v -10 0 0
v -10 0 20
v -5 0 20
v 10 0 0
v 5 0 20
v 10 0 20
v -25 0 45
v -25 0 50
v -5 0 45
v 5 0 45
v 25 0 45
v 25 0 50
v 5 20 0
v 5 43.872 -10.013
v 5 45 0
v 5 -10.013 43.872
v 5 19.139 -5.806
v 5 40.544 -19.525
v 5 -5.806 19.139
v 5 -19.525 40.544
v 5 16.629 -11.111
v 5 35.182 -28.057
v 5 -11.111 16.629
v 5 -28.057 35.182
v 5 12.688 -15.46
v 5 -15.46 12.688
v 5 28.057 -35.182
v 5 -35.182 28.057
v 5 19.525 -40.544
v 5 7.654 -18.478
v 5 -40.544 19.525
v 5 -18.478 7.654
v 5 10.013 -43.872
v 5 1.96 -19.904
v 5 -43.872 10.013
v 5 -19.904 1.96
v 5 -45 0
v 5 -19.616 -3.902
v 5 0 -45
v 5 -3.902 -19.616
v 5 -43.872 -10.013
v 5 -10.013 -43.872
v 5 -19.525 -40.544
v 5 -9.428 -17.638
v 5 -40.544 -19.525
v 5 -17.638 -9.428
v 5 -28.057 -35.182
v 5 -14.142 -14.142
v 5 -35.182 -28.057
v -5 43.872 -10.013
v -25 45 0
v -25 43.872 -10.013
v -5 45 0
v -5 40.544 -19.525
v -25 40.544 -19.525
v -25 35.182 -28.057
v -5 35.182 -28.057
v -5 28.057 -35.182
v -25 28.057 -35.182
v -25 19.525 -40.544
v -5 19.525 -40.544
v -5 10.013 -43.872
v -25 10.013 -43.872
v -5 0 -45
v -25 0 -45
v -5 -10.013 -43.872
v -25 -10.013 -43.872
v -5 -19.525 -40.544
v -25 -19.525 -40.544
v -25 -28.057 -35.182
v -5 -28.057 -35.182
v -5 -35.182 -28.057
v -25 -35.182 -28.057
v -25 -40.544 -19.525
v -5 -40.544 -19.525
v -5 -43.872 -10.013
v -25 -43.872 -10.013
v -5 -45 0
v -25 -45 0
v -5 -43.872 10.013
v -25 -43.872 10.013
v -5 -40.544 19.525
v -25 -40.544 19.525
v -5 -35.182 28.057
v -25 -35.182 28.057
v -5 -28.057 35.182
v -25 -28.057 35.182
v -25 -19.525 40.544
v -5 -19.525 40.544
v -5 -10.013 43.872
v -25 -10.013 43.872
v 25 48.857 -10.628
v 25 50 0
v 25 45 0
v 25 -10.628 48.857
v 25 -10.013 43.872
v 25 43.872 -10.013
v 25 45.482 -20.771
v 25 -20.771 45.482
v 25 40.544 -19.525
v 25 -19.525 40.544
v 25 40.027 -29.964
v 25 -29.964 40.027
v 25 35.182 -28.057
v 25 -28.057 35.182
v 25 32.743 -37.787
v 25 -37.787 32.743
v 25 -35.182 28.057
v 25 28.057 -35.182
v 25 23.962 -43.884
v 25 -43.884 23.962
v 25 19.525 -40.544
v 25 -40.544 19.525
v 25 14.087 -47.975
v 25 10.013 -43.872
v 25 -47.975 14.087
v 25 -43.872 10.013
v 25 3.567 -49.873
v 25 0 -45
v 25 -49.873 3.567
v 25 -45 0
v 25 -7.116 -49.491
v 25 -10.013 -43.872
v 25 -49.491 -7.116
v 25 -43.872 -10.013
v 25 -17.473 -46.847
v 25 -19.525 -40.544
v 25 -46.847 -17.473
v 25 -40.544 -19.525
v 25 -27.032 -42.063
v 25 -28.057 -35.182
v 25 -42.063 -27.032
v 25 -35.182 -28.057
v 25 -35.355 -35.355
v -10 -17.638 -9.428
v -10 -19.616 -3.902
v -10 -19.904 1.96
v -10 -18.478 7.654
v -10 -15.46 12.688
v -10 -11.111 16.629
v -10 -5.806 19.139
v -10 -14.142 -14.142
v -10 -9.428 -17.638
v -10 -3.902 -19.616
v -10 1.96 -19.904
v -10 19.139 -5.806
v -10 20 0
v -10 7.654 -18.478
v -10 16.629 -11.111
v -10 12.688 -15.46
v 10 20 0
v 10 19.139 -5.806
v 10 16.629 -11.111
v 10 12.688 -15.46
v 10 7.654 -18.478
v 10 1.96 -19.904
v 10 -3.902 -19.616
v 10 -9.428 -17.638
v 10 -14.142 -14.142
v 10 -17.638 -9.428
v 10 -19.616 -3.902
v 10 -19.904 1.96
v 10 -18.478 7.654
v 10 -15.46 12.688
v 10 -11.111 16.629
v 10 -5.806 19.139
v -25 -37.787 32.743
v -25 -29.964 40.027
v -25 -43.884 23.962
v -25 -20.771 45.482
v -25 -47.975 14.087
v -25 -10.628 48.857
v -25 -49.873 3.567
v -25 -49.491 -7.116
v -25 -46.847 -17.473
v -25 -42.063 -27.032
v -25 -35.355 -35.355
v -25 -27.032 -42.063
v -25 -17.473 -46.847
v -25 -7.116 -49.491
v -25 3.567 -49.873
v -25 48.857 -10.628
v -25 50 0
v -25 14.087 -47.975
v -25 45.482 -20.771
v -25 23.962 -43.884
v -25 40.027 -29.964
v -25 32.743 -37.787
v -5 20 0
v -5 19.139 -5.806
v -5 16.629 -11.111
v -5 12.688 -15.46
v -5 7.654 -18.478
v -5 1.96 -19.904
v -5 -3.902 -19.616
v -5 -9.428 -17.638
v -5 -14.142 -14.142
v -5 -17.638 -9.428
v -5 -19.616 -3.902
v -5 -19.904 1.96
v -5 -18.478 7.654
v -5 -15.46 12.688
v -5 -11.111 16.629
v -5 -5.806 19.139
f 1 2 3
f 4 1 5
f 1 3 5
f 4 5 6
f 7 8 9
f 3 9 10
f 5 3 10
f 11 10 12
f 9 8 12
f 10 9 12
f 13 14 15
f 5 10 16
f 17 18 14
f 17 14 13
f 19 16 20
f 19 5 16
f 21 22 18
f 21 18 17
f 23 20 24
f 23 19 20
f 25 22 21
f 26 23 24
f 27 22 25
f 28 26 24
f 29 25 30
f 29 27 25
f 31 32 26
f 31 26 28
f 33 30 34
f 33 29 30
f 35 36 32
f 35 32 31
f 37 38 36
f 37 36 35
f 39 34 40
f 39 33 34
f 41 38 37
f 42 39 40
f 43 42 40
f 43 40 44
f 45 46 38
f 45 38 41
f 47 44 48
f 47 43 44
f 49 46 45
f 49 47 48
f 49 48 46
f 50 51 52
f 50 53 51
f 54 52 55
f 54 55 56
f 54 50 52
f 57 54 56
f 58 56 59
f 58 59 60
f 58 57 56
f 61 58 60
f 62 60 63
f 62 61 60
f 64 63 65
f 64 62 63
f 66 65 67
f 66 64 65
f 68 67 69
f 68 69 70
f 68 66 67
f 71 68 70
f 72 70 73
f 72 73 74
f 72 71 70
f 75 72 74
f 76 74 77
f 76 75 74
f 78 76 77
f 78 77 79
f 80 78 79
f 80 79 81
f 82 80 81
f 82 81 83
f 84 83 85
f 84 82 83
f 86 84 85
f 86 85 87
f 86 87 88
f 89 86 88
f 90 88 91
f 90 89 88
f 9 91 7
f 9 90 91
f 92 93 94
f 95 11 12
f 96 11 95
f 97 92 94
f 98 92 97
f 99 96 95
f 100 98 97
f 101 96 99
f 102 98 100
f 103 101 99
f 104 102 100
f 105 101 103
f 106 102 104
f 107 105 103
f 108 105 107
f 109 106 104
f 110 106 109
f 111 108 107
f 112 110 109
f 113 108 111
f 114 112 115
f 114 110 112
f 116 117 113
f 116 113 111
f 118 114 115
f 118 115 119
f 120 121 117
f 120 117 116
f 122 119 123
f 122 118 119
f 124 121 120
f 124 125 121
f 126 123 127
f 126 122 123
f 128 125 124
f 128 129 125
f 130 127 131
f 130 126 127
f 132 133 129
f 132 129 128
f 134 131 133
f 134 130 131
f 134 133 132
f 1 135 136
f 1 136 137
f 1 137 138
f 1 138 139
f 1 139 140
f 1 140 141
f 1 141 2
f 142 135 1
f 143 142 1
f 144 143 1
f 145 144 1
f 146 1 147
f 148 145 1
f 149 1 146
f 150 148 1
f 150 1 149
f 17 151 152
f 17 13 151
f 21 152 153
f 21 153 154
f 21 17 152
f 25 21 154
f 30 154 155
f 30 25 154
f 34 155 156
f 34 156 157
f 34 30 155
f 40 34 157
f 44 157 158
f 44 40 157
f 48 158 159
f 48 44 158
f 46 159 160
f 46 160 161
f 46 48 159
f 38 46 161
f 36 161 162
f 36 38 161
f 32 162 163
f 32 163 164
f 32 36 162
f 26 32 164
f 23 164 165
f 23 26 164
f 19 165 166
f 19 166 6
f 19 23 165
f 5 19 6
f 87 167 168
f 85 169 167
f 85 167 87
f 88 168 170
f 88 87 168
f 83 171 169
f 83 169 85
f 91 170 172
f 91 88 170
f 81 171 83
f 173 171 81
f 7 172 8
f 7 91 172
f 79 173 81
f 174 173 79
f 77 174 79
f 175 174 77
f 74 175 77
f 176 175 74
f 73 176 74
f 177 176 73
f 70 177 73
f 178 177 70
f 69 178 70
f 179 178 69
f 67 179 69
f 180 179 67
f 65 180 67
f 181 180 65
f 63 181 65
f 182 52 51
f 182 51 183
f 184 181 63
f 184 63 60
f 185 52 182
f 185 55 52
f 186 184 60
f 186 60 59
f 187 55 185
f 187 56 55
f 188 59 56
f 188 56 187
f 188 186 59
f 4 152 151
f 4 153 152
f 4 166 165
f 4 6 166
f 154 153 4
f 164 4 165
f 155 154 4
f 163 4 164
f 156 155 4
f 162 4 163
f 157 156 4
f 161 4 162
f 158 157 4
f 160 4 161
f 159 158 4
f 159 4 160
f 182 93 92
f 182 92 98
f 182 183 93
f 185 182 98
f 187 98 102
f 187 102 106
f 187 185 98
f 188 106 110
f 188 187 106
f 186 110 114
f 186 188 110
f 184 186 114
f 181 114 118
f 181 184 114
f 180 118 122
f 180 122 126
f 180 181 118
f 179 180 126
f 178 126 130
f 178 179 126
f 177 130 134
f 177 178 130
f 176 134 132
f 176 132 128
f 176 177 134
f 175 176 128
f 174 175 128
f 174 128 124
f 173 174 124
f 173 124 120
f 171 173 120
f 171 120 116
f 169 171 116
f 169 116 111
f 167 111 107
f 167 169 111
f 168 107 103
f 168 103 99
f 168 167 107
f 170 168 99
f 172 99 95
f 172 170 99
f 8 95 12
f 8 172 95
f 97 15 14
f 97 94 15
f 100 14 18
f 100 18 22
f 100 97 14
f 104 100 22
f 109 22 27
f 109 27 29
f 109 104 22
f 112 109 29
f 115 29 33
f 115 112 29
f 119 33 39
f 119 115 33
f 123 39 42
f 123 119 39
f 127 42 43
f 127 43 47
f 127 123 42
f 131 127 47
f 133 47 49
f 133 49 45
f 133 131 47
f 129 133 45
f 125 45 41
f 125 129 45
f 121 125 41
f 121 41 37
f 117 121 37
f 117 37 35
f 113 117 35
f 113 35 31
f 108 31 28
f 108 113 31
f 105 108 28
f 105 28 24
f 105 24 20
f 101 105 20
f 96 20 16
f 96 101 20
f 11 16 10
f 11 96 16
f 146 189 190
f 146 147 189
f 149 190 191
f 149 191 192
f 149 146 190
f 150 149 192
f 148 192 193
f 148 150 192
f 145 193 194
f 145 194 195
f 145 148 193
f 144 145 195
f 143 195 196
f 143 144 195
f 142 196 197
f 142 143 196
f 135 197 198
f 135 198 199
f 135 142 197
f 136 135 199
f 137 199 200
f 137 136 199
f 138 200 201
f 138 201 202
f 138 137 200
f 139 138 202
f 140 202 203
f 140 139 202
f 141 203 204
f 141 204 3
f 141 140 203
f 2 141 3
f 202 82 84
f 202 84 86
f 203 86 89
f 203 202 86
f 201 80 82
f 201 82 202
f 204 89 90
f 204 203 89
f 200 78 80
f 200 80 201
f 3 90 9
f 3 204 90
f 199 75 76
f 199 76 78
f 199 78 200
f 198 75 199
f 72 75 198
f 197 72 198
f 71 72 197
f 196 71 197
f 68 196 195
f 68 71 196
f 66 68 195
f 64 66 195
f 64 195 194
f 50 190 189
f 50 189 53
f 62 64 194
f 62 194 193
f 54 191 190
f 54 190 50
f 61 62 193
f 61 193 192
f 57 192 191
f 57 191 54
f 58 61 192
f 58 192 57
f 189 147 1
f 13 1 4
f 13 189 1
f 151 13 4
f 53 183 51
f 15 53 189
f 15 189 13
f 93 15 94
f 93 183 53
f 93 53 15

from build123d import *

# Parameters (mm, degrees)
REVOLVE2_ANGLE = 270


with BuildPart() as part:
    # Sketch1 → Revolve2 (revolve)
    with BuildSketch(Plane.XY):
        Polygon((-10, 0), (10, 0), (10, 20), (5, 20), (5, 45), (25, 45), (25, 50), (-25, 50), (-25, 45), (-5, 45), (-5, 20), (-10, 20), align=None)
    revolve(axis=Axis((-10, 0, 0), (-1, 0, 0)), revolution_arc=REVOLVE2_ANGLE)


solid = part.part
